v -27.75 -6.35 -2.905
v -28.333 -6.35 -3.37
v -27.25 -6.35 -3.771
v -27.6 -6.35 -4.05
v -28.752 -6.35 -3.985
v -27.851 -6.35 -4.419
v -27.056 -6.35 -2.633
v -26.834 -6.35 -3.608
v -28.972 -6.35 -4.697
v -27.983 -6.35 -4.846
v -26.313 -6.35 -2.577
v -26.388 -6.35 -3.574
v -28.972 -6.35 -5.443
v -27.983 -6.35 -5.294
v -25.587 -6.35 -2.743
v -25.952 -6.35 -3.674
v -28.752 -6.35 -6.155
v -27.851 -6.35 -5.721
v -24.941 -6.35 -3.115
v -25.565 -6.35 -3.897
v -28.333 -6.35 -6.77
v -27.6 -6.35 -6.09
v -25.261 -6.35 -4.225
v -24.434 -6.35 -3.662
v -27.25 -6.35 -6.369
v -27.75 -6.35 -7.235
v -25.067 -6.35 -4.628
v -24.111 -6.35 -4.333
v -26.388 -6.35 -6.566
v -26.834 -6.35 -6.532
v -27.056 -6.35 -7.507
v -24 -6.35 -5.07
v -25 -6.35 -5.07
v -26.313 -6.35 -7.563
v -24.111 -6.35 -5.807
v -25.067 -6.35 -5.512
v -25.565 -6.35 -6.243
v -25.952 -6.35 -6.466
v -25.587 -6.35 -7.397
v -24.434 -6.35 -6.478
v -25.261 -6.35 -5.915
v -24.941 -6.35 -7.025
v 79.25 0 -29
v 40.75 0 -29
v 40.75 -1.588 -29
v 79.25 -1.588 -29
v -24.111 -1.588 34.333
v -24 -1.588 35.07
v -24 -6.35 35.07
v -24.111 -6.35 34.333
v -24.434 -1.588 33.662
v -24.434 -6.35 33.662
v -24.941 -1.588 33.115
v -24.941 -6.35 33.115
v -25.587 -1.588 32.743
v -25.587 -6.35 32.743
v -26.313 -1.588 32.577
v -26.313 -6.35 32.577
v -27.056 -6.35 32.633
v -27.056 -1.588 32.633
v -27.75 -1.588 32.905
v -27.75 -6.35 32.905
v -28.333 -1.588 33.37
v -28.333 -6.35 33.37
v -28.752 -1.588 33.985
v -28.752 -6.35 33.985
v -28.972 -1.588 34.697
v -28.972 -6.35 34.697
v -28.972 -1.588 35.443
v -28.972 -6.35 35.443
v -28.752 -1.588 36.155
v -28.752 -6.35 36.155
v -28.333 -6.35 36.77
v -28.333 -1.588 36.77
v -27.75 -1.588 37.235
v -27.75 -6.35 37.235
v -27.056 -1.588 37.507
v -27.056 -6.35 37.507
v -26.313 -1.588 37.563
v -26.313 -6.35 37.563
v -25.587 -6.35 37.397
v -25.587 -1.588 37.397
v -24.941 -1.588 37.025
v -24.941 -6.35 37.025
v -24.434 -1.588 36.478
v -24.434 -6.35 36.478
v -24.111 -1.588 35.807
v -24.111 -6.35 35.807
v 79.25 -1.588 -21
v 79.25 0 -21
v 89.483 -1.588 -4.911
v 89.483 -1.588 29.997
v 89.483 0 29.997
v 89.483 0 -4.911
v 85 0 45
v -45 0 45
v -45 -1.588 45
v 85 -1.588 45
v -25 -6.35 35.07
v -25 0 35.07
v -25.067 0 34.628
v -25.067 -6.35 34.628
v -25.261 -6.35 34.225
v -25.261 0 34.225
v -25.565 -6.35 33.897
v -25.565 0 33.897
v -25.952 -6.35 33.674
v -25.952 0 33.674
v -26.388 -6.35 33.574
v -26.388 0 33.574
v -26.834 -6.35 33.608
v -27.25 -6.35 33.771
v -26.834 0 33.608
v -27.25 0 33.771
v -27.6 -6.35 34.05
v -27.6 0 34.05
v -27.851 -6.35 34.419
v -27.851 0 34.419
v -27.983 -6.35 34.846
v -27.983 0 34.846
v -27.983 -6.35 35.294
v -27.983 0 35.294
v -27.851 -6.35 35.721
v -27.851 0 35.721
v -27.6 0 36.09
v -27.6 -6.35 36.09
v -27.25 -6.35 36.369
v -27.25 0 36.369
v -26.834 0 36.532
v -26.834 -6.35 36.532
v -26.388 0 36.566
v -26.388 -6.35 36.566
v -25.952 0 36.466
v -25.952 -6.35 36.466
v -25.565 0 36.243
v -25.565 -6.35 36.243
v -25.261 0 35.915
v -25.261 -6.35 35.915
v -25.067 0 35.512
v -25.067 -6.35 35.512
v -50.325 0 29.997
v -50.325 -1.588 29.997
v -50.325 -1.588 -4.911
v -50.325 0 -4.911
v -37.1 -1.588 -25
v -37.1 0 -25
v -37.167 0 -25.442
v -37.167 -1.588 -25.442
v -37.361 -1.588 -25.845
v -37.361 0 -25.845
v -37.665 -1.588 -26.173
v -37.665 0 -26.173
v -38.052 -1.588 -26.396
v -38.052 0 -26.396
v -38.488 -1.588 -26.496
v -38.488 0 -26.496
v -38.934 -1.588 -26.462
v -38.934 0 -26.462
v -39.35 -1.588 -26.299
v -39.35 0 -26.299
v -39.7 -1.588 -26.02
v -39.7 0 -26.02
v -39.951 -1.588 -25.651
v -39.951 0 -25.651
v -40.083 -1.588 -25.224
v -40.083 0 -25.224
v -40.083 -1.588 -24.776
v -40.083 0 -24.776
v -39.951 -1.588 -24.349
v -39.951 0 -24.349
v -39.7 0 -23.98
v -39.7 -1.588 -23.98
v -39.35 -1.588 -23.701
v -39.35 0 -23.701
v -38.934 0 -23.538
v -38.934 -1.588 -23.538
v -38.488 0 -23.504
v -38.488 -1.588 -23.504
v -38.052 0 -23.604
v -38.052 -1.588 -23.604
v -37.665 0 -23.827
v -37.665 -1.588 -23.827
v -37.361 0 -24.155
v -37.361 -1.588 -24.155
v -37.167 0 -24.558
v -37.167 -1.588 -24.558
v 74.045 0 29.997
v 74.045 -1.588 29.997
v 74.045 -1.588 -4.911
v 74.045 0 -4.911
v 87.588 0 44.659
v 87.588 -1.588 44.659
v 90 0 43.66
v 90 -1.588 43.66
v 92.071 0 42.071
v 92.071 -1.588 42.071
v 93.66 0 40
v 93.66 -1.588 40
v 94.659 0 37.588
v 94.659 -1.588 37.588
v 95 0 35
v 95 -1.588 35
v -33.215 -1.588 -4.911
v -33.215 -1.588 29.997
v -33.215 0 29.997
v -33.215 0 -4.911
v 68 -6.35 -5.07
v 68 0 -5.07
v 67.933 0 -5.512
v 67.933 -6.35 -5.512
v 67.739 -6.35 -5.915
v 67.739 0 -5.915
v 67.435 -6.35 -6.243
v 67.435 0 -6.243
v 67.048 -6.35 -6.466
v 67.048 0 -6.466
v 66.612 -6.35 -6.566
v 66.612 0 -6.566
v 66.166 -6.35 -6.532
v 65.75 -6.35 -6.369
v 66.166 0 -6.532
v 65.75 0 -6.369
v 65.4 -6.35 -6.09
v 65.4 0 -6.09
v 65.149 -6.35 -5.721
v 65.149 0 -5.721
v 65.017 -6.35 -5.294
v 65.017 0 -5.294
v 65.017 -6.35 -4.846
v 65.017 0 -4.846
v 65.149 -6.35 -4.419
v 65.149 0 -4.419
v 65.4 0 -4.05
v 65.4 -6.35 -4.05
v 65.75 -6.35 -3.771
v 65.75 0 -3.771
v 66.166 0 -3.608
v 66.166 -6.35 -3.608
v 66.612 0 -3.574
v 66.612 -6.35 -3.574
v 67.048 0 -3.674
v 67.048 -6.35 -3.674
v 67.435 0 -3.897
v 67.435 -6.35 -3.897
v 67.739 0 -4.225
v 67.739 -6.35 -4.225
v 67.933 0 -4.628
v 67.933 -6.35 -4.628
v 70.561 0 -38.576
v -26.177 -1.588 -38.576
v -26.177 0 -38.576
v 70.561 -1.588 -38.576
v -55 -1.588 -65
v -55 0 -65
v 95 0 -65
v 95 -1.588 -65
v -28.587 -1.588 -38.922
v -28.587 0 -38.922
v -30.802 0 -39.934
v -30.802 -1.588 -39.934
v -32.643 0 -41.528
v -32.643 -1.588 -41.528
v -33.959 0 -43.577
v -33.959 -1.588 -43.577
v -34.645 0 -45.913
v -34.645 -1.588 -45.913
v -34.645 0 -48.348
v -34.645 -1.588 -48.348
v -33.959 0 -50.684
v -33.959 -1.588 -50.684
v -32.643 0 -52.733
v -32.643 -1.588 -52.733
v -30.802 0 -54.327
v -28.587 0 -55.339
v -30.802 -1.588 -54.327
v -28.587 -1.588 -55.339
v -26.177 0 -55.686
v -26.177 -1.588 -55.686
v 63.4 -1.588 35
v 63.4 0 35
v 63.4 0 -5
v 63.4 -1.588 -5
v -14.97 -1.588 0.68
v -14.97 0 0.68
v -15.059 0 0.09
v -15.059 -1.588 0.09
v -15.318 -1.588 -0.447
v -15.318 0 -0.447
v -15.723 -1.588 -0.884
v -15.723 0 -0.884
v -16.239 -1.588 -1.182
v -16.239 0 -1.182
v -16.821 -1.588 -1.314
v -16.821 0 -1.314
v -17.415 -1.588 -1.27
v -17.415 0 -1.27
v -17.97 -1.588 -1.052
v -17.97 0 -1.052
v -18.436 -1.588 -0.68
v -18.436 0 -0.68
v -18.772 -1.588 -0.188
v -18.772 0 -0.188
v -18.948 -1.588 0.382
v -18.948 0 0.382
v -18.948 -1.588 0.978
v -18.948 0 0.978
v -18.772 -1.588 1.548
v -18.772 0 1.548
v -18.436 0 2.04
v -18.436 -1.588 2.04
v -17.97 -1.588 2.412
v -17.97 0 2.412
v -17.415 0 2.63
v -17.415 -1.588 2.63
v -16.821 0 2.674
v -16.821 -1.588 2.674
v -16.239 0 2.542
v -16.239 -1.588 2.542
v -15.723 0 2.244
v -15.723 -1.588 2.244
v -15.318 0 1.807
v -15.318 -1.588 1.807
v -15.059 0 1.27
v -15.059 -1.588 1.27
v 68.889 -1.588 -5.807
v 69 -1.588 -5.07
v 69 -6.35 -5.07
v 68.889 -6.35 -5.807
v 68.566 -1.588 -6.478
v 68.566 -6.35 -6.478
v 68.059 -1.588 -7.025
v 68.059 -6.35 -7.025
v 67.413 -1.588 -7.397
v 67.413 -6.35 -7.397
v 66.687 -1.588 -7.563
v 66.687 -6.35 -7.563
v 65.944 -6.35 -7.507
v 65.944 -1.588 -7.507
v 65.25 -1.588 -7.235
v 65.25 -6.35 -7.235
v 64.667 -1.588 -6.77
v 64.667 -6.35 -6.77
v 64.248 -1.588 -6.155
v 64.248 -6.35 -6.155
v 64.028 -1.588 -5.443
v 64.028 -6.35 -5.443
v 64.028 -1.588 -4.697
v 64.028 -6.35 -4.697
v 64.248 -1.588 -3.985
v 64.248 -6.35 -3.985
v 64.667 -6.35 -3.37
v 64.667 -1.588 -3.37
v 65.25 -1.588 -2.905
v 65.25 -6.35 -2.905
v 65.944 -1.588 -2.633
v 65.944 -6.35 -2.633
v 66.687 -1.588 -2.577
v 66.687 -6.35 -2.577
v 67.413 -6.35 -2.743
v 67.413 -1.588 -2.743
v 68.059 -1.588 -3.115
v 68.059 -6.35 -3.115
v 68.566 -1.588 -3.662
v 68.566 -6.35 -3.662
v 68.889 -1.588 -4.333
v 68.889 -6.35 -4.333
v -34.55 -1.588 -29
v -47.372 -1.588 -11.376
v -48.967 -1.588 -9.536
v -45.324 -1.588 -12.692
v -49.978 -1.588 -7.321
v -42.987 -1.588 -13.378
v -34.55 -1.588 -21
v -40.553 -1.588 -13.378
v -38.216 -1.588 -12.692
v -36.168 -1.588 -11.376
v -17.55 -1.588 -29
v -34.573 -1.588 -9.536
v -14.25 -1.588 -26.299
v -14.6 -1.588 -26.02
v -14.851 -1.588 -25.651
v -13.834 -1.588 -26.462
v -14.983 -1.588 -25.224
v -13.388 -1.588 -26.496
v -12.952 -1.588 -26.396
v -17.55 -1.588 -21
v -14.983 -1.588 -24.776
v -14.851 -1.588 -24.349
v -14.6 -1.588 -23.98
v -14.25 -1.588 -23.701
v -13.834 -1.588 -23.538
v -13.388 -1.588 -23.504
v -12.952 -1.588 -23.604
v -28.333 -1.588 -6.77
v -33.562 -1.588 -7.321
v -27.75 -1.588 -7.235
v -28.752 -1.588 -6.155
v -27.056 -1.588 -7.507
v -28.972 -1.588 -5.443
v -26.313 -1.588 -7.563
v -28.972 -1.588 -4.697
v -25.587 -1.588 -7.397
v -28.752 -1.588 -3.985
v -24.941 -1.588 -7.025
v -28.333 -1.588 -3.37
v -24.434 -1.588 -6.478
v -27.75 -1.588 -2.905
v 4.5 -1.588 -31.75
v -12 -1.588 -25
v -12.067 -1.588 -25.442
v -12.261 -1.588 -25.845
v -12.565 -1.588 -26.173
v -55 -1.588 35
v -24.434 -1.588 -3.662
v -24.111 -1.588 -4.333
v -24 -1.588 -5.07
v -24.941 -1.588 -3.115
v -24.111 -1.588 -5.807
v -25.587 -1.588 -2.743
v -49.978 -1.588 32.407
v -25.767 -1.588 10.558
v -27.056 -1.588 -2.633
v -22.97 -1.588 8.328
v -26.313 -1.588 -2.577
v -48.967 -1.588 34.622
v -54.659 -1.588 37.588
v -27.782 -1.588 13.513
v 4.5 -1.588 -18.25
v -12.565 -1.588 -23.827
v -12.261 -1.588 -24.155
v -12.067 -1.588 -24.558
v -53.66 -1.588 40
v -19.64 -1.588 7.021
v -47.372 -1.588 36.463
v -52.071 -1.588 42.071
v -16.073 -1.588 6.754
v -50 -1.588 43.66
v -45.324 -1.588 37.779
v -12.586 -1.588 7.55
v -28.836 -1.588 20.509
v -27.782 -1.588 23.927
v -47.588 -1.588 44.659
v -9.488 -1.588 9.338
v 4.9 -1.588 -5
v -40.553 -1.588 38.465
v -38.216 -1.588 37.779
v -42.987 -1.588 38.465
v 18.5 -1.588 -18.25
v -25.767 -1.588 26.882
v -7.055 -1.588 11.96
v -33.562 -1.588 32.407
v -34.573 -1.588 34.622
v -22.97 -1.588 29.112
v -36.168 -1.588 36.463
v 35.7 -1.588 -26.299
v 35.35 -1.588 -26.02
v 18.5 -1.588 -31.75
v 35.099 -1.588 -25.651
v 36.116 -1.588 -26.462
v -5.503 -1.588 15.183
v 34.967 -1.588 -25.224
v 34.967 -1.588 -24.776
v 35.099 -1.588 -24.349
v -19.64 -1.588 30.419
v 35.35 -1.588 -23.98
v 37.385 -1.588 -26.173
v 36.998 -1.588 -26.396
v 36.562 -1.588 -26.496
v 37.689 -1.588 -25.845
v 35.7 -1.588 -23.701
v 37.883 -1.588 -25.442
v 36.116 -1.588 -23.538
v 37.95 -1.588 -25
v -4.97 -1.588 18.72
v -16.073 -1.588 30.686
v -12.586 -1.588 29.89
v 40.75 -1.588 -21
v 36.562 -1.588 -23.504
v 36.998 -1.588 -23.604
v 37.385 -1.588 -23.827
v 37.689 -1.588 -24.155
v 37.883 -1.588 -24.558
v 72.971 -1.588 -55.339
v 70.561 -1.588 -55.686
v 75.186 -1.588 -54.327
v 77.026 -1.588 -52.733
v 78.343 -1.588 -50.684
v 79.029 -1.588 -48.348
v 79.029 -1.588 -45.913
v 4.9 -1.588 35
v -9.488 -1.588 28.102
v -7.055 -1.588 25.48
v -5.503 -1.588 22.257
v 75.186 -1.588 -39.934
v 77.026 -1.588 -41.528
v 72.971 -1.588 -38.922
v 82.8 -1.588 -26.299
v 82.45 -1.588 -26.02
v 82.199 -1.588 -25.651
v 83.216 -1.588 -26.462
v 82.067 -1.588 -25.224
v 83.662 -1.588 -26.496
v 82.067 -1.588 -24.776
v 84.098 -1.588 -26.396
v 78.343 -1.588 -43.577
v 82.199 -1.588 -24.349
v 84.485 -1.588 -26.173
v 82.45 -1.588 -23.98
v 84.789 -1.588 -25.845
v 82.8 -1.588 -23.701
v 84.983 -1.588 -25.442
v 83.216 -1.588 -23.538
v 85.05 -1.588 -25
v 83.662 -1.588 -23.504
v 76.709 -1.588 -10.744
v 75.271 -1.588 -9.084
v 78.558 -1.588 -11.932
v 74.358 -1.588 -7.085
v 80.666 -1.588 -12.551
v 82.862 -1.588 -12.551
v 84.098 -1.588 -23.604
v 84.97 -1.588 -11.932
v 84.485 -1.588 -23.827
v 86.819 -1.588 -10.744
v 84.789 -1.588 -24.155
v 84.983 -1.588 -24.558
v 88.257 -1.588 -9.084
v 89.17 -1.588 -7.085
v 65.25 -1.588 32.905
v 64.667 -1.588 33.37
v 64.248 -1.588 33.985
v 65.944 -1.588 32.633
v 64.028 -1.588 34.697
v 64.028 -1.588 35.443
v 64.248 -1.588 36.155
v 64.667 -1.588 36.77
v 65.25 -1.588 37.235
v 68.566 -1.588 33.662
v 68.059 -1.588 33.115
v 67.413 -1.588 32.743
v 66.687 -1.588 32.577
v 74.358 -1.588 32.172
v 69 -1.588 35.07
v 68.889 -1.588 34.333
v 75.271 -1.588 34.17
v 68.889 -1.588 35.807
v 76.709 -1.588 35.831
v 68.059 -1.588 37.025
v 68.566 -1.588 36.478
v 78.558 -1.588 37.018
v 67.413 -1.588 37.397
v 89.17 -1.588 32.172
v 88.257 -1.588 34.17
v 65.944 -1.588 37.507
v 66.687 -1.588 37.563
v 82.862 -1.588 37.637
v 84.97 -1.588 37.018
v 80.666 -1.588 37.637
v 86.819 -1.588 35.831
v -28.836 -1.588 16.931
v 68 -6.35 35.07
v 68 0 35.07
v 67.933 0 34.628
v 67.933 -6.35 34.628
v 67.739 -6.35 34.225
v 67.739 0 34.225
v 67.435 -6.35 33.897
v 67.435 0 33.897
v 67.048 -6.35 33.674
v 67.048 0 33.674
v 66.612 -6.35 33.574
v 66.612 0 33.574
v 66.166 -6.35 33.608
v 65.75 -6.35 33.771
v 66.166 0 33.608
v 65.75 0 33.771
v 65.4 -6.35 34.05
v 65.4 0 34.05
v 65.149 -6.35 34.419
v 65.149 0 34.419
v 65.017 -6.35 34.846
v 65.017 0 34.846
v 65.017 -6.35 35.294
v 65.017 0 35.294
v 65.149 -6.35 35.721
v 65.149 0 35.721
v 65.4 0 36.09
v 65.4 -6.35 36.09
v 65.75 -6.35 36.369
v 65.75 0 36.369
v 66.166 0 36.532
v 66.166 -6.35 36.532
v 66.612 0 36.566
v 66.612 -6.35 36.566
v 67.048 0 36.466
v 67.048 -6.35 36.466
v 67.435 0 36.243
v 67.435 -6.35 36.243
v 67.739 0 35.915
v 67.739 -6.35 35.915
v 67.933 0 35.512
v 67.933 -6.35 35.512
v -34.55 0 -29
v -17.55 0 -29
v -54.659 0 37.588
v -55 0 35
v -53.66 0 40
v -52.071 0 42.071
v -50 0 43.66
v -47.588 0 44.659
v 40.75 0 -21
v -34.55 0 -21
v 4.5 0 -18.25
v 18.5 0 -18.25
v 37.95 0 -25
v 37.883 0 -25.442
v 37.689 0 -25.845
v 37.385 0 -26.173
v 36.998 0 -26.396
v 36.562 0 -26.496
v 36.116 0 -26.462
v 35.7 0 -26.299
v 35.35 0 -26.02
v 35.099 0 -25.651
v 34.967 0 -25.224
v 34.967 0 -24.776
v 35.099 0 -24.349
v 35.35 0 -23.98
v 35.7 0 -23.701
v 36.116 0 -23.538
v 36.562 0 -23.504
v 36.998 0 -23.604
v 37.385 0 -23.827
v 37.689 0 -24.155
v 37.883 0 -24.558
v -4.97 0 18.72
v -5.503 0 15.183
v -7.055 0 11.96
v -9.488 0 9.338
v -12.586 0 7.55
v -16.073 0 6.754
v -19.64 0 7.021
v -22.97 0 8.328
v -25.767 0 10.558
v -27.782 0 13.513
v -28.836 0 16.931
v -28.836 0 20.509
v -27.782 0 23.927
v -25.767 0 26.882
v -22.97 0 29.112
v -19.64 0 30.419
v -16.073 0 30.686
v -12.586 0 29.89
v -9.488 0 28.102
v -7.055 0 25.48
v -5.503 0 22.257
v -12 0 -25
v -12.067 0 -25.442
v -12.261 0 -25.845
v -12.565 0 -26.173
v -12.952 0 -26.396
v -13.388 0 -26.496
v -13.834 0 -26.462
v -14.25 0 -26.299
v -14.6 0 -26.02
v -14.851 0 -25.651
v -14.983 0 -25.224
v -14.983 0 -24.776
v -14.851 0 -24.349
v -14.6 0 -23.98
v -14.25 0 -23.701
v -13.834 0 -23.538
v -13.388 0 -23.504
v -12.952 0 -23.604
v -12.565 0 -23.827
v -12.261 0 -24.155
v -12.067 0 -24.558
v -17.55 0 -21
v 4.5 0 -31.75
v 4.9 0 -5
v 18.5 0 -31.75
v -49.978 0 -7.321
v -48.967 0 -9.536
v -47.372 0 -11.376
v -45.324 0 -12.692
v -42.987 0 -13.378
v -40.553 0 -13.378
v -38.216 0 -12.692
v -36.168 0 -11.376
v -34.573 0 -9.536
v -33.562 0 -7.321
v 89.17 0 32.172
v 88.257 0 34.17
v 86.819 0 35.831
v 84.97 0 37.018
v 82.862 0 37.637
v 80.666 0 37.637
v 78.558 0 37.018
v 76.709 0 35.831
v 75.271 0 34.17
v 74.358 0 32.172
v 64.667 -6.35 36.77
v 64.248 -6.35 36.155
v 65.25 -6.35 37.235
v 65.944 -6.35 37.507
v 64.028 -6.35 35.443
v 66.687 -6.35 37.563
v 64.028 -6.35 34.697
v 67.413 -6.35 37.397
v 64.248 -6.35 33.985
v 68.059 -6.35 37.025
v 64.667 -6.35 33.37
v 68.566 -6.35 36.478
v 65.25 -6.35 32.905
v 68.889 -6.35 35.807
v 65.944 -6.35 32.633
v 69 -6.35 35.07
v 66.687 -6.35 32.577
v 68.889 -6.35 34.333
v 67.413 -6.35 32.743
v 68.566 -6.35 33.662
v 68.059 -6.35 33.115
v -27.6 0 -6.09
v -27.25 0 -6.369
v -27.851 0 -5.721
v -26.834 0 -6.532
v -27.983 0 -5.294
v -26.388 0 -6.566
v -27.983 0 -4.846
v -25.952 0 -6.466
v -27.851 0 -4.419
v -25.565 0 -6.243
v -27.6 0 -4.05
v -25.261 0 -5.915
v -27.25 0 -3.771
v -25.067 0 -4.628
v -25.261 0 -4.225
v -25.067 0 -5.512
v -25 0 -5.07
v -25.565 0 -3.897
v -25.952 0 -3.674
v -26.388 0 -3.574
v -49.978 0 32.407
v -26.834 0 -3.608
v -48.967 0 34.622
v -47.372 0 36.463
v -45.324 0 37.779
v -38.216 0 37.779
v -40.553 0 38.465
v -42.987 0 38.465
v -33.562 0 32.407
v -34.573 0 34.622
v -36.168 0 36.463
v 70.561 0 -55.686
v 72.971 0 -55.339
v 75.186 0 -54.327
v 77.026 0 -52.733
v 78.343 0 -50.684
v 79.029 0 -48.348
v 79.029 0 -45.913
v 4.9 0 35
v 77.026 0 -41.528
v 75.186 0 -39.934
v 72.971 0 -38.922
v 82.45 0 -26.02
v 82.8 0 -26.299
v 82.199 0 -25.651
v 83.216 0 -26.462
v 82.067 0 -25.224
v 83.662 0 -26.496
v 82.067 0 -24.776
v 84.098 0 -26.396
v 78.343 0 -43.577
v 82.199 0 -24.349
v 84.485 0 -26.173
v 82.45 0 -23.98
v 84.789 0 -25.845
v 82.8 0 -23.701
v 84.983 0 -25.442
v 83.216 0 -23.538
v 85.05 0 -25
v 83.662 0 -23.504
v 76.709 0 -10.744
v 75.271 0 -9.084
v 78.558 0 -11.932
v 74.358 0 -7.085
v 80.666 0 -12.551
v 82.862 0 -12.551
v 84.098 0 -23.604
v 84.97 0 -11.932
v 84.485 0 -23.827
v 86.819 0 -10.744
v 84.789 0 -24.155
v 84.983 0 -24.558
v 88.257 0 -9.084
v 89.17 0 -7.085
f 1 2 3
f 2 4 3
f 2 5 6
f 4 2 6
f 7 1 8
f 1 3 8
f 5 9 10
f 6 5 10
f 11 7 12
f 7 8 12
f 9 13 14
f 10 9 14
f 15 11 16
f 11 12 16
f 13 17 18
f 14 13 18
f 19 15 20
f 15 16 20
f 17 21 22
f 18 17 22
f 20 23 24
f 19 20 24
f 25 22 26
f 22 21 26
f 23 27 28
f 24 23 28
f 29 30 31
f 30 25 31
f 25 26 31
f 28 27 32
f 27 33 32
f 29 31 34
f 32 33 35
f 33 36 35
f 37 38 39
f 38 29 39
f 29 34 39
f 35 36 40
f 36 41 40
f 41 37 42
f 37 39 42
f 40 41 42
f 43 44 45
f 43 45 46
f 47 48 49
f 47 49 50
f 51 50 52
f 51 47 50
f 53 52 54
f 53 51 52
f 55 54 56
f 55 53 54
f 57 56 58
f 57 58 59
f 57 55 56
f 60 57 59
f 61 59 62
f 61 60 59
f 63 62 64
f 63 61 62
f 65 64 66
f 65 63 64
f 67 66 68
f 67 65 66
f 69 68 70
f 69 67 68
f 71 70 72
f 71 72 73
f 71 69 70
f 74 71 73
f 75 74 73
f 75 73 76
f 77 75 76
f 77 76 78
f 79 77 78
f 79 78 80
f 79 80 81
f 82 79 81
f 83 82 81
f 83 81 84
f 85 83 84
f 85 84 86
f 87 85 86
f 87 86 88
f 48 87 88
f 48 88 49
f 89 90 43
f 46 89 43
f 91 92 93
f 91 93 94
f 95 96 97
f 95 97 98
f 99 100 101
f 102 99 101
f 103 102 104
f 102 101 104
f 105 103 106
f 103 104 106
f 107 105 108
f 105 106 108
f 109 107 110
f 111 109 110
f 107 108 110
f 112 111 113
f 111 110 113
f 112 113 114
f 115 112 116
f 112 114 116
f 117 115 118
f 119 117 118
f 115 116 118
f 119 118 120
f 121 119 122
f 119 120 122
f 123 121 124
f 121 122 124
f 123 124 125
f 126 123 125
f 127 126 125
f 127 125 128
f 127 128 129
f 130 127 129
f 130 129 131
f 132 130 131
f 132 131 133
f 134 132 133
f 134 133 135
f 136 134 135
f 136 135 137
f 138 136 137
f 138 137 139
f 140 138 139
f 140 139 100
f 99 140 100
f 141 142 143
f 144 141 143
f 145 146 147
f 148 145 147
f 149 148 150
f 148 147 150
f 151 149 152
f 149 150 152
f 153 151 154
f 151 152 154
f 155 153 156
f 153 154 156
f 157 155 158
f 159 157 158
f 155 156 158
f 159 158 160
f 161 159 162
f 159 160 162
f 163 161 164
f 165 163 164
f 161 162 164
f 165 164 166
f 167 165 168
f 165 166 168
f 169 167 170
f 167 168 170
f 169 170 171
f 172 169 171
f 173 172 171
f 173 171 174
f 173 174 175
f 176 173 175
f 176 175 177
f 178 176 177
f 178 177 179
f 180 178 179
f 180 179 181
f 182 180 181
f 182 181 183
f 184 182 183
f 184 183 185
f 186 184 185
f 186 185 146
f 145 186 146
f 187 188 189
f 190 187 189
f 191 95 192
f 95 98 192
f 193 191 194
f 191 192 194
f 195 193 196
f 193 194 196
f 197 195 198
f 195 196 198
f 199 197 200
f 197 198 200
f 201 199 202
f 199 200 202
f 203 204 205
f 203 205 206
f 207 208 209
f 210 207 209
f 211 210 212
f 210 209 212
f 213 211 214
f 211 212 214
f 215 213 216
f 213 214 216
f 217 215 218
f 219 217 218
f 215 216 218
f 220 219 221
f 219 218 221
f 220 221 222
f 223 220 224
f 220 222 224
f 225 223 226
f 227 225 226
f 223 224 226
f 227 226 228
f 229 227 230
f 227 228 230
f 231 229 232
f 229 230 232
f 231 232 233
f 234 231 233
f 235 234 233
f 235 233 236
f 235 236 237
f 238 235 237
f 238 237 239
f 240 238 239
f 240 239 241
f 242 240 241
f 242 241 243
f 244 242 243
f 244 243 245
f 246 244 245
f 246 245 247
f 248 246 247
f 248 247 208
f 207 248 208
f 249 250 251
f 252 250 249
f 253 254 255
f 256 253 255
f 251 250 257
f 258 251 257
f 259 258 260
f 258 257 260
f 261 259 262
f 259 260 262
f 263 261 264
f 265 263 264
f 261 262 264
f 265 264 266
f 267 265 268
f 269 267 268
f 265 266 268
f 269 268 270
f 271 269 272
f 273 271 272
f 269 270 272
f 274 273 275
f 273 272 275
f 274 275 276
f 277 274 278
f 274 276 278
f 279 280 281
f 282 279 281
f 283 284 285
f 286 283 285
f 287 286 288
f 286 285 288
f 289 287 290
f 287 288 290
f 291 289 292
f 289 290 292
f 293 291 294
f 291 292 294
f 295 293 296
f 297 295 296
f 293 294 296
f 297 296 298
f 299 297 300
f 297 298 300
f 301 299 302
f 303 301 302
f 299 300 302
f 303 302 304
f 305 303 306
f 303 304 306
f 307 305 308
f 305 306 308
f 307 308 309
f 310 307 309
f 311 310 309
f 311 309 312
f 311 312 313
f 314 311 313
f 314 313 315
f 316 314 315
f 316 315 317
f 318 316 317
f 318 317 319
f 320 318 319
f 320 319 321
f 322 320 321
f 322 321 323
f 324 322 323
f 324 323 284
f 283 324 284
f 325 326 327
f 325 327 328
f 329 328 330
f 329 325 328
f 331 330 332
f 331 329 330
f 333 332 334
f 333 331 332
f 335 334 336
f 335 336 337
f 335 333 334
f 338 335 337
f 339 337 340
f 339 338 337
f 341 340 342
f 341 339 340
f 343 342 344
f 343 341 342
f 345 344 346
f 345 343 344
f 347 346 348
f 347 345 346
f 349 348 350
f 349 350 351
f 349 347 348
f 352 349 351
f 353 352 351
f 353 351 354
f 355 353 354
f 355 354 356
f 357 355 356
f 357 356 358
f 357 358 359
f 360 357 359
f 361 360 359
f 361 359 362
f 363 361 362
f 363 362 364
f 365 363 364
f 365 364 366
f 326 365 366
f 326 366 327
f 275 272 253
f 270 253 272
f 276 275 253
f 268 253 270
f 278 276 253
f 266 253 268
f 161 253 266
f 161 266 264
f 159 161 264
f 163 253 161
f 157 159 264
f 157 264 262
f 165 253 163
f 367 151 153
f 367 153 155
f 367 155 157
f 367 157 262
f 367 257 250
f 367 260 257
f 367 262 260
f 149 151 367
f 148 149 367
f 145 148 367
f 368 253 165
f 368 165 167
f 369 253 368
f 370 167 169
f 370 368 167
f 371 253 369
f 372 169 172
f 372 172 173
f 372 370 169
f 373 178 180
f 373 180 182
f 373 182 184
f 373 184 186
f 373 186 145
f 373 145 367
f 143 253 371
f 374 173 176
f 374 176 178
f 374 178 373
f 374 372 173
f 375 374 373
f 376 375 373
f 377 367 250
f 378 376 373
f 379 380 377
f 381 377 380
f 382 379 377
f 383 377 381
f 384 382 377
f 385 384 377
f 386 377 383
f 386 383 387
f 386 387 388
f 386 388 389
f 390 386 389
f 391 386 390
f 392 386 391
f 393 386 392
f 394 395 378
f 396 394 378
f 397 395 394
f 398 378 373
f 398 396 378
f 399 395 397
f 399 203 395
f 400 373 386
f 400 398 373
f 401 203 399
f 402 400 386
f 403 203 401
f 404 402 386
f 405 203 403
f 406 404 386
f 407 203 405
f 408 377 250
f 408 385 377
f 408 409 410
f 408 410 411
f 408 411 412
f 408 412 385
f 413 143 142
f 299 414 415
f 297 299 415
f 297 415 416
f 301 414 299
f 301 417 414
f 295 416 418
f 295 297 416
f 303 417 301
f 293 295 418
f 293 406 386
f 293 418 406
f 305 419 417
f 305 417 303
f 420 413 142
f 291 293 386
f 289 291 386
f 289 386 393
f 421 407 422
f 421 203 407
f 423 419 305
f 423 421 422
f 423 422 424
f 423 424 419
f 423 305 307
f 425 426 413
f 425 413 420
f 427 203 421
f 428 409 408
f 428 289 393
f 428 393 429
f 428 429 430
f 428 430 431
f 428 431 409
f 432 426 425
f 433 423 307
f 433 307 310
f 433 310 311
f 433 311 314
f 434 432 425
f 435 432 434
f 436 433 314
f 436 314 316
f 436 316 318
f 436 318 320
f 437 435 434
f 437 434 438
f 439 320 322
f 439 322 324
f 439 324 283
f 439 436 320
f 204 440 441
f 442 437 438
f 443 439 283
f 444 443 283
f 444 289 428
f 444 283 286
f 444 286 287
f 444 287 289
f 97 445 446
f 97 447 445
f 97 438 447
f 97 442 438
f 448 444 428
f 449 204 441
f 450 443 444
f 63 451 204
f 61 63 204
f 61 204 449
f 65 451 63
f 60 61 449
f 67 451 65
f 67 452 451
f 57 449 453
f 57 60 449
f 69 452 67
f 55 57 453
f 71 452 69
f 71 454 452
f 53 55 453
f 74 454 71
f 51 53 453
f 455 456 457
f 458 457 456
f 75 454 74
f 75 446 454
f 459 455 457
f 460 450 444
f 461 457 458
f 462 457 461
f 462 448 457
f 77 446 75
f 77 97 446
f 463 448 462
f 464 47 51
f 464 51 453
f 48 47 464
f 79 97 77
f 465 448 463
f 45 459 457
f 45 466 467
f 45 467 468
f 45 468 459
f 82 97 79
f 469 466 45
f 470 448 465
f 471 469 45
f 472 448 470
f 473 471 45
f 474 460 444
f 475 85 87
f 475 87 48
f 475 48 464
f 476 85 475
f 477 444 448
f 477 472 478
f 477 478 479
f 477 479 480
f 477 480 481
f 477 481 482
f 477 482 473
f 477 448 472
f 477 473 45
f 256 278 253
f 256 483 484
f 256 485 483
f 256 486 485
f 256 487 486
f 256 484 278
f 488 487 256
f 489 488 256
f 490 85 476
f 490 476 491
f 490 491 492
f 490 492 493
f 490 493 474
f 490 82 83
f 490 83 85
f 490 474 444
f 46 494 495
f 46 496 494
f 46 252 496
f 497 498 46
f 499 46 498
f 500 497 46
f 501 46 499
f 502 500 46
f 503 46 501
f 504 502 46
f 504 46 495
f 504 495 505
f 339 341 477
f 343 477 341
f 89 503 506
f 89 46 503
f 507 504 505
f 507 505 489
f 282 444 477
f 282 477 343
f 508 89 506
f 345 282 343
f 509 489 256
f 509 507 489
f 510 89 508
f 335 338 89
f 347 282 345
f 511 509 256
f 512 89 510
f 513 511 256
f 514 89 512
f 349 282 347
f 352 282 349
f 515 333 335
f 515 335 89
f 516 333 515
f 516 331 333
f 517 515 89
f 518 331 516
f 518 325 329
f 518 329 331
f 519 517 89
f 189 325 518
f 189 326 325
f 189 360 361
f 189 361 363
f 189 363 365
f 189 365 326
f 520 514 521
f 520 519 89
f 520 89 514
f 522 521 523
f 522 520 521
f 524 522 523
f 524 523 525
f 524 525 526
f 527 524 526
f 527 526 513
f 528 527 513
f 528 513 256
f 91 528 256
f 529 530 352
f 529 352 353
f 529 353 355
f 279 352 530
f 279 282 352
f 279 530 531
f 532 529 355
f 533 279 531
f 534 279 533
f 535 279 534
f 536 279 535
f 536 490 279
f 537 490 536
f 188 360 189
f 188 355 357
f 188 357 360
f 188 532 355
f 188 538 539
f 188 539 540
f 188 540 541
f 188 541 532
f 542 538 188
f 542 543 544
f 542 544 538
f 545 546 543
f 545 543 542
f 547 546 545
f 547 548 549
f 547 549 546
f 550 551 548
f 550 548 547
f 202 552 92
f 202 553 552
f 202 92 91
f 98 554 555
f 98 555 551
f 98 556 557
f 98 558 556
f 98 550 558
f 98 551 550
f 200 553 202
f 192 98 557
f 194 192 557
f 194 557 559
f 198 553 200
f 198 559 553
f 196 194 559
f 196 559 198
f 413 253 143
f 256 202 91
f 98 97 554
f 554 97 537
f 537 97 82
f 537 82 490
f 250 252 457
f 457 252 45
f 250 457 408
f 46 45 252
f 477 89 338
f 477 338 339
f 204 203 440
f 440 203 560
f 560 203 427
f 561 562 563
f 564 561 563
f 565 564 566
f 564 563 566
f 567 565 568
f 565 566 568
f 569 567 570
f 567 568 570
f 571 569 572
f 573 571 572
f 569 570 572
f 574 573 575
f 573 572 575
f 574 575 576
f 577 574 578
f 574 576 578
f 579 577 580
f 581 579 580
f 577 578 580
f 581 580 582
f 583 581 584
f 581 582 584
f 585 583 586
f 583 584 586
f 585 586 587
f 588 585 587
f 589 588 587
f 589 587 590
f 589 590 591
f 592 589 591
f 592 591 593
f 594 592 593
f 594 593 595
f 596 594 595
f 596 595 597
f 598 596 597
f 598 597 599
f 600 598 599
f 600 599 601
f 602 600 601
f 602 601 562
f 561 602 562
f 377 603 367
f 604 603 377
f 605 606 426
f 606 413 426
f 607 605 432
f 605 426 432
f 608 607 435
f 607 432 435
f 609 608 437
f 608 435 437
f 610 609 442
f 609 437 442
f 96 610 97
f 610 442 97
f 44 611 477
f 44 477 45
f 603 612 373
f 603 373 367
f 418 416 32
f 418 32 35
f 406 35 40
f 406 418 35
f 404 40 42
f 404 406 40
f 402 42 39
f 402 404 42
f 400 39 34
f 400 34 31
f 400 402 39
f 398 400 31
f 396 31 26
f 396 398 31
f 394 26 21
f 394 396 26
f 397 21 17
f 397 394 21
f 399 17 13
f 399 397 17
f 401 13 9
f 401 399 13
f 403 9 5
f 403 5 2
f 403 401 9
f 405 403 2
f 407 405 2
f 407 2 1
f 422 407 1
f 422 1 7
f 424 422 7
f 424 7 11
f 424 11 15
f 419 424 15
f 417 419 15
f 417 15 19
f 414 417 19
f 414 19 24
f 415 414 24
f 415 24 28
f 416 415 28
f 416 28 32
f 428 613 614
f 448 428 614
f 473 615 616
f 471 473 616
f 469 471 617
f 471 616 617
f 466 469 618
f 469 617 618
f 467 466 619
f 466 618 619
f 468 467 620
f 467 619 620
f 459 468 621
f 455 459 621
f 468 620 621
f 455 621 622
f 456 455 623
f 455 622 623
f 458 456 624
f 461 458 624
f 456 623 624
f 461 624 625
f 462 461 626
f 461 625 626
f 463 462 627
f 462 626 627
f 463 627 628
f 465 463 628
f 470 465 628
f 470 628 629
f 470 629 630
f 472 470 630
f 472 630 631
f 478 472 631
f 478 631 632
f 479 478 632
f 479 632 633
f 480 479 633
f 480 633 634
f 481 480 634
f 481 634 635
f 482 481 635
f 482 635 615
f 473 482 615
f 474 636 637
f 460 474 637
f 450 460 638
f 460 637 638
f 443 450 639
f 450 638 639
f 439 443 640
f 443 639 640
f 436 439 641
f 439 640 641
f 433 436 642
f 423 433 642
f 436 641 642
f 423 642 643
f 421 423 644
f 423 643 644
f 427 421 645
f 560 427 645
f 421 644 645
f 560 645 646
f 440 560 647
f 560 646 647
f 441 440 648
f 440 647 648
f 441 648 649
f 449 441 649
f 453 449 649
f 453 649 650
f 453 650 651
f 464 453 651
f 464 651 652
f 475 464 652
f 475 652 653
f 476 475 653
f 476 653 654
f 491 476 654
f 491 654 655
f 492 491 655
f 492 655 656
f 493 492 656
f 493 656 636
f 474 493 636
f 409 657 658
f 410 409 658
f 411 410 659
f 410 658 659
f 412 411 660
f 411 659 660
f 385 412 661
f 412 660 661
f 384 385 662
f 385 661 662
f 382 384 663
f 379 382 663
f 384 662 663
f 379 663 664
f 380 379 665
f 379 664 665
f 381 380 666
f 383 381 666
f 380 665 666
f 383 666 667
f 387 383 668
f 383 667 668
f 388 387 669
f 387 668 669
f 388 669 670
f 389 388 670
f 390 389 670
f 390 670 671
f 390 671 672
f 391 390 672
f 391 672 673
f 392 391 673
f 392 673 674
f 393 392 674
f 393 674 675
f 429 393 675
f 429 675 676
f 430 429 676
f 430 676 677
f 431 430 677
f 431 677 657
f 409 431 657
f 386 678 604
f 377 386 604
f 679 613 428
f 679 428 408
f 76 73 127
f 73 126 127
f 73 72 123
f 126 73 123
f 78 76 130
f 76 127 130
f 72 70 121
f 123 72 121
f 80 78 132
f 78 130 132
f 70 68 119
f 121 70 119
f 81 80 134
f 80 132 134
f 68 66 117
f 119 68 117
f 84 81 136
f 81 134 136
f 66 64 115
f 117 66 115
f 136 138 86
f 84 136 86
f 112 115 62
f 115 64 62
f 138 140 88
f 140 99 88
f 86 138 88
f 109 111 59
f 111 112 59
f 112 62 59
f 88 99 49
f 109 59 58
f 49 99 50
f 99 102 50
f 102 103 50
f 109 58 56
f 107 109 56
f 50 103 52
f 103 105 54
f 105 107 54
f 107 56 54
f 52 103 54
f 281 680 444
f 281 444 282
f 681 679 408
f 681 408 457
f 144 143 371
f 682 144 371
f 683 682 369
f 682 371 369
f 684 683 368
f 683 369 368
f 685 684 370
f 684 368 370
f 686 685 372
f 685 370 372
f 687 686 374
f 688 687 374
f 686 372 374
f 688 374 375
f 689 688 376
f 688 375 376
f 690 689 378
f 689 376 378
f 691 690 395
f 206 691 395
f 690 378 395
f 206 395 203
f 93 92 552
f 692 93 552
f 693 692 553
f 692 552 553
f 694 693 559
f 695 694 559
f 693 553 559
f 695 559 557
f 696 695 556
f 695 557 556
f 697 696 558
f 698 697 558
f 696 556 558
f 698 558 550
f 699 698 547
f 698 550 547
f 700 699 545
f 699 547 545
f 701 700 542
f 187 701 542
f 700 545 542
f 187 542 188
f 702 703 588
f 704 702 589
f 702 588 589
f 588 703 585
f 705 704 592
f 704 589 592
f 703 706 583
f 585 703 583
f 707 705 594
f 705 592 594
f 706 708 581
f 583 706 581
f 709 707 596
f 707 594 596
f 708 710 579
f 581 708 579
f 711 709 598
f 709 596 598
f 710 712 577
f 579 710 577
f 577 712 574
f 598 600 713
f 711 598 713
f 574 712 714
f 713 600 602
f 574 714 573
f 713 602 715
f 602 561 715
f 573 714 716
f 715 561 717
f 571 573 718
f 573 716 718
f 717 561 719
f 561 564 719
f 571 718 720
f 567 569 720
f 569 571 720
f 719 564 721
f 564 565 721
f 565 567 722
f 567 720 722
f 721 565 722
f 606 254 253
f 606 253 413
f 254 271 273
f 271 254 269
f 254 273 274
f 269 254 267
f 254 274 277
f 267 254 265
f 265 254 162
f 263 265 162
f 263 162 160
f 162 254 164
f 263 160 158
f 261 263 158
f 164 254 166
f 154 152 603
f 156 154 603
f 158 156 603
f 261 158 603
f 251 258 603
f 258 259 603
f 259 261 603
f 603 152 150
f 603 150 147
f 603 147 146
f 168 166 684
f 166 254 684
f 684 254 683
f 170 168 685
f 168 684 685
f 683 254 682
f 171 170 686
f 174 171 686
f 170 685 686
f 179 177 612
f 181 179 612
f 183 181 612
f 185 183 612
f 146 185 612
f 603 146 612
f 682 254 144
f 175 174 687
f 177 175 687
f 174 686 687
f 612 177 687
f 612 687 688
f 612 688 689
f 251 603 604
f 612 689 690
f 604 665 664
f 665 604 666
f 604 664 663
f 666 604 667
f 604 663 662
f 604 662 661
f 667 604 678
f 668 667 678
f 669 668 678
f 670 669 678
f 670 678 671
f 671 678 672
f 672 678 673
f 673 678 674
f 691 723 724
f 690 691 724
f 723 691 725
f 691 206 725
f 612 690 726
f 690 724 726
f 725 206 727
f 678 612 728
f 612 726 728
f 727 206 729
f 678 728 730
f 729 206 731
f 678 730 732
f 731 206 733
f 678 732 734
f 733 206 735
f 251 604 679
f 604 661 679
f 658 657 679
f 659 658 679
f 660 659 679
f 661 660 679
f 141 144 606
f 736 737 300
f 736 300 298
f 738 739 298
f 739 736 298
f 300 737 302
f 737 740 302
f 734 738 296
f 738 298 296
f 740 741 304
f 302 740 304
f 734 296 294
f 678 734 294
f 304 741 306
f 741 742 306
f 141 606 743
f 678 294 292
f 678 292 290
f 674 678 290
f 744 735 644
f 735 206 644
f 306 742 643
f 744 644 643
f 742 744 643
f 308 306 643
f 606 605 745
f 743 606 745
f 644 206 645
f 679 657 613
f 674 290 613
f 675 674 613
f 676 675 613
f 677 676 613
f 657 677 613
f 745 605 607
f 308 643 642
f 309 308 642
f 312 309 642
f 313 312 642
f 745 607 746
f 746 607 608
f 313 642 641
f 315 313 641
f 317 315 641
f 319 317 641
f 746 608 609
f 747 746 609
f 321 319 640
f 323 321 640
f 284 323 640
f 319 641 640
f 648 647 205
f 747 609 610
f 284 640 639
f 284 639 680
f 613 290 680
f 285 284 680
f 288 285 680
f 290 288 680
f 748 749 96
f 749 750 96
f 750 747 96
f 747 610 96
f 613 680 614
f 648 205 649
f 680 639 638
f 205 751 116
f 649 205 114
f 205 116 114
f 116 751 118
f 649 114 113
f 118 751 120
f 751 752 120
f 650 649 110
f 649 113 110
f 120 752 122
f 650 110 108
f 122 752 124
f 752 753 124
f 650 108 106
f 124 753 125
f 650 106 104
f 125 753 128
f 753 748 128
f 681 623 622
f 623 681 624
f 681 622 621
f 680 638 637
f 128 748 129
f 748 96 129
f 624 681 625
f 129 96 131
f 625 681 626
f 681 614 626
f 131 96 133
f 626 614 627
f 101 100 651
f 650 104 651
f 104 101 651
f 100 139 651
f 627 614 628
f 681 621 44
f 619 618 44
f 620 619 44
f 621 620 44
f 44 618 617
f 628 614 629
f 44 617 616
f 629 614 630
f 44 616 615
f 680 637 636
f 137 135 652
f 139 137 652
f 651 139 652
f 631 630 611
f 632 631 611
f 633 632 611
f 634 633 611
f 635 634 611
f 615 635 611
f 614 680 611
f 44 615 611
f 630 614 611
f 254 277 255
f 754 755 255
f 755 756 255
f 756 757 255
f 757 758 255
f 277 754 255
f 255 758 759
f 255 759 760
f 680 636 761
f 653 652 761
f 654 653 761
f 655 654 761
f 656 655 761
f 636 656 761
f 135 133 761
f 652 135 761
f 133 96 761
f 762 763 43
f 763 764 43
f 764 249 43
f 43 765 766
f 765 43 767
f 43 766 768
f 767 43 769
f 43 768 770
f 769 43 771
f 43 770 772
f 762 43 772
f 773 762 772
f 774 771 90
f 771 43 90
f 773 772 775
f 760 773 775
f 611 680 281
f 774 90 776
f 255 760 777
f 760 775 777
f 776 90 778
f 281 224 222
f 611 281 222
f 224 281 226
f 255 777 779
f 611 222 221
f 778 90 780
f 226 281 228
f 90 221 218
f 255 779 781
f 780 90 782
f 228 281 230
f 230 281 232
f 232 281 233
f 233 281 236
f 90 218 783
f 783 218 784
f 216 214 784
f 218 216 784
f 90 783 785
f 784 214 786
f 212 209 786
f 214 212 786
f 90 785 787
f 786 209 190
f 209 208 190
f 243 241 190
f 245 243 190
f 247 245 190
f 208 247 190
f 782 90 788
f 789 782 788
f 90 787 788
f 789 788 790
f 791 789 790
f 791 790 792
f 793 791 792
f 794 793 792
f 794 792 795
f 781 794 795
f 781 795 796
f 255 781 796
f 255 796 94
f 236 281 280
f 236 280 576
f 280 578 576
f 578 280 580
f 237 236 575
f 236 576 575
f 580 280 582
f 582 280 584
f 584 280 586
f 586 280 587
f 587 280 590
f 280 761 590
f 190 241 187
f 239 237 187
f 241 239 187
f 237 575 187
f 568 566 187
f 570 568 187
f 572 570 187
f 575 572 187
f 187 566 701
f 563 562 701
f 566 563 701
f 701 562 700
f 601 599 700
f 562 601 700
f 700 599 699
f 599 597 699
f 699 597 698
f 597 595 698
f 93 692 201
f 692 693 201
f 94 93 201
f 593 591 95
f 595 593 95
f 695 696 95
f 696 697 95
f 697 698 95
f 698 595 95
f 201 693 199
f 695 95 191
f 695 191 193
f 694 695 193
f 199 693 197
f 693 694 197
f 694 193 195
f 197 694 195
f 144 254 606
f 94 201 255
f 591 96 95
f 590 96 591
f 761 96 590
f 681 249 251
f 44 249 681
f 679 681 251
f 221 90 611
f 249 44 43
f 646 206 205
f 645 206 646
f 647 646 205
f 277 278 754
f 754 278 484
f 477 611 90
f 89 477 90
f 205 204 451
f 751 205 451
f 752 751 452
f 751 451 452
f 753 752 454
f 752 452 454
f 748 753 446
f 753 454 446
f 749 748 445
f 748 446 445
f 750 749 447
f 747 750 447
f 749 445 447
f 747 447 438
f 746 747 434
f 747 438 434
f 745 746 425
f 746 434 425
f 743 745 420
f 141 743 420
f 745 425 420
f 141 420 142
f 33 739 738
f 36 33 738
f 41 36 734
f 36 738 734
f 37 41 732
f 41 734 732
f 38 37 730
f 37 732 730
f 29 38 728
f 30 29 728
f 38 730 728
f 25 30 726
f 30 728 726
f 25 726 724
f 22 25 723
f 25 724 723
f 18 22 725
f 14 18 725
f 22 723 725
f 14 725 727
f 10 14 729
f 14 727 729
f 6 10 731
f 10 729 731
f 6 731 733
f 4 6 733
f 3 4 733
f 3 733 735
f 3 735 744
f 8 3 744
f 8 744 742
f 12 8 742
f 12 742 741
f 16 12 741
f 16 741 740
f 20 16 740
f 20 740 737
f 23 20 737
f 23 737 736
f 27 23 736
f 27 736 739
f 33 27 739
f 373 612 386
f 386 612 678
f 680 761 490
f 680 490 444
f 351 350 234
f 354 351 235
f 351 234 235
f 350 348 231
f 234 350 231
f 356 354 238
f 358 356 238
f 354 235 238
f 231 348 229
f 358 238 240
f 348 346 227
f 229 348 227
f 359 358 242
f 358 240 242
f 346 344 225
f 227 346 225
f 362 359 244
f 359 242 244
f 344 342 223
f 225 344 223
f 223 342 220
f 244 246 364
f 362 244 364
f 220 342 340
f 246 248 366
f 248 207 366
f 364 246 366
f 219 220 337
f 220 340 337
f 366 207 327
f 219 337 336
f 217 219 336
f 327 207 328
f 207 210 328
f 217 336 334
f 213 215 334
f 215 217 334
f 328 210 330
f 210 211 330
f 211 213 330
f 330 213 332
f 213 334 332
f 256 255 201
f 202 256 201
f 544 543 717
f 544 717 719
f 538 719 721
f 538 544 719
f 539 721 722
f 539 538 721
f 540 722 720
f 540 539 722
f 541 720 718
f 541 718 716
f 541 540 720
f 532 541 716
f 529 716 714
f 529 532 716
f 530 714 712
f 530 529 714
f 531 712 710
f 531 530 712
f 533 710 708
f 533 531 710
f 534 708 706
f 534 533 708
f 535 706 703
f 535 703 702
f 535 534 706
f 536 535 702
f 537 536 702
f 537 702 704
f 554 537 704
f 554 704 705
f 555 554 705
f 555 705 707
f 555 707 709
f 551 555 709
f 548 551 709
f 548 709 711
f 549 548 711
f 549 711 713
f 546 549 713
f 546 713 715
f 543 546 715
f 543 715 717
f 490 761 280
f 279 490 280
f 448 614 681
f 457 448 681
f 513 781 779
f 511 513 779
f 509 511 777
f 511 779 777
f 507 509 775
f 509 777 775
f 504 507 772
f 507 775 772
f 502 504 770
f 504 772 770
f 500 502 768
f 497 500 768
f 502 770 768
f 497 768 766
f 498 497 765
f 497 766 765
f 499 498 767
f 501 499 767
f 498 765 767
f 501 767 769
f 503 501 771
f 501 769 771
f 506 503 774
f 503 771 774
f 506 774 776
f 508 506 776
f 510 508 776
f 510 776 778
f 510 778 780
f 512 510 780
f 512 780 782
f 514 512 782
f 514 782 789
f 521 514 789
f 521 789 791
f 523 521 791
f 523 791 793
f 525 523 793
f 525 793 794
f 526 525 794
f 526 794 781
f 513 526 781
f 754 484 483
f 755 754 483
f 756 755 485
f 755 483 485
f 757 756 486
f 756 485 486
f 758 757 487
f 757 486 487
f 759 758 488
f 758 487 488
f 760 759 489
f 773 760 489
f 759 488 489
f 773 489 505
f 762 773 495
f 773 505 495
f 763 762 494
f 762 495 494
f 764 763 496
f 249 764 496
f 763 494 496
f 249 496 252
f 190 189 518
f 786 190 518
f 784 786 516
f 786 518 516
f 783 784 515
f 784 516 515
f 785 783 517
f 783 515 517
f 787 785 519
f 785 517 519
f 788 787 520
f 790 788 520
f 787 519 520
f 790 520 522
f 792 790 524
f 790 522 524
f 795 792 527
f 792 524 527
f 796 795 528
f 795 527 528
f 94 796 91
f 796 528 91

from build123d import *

# Parameters (mm, degrees)
SKETCH_W        = 150
SKETCH_H        = 110
PAD_DEPTH       = 1.5875
SKETCH001_R     = 1.5
SKETCH001_R_2   = 12
SKETCH001_R_3   = 2
SKETCH001_W     = 58.5
SKETCH001_H     = 40
POCKET_DEPTH    = 1.5885
SKETCH002_R     = 1.5
SKETCH002_W     = 38.5
SKETCH002_H     = 8
SKETCH002_W_2   = 14
SKETCH002_H_2   = 13.5
SKETCH002_W_3   = 17
POCKET001_DEPTH = 1.5885
SKETCH003_R     = 2.5
SKETCH003_R_2   = 1.5
PAD001_DEPTH    = 6.35
POCKET002_DEPTH = 1.5885
FILLET_R        = 10


with BuildPart() as part:
    # Sketch → Pad (new body)
    with BuildSketch(Plane.XZ):
        with Locations((20, -10)):
            Rectangle(SKETCH_W, SKETCH_H)
    extrude(amount=PAD_DEPTH)

    # Sketch001 (on Face5 of Pad) → Pocket (cut, through all)
    with BuildSketch(Plane(origin=(0, 0, 0), x_dir=(1, 0, 0), z_dir=(0, 1, 0))):
        with Locations((-26.5, 5.07)):
            Circle(SKETCH001_R)
        with Locations((-26.5, -35.07)):
            Circle(SKETCH001_R)
        with Locations((66.5, -35.07)):
            Circle(SKETCH001_R)
        with Locations((66.5, 5.07)):
            Circle(SKETCH001_R)
        with Locations((-16.97, -18.72)):
            Circle(SKETCH001_R_2)
        with Locations((-16.97, -0.68)):
            Circle(SKETCH001_R_3)
        with Locations((34.15, -15)):
            Rectangle(SKETCH001_W, SKETCH001_H)
    extrude(amount=-POCKET_DEPTH, mode=Mode.SUBTRACT)

    # Sketch002 (on Face4 of Pocket) → Pocket001 (cut, through all)
    with BuildSketch(Plane(origin=(0, 0, 0), x_dir=(1, 0, 0), z_dir=(0, 1, 0))):
        with Locations((36.45, 25)):
            Circle(SKETCH002_R)
        with Locations((83.55, 25)):
            Circle(SKETCH002_R)
        with Locations((-38.6, 25)):
            Circle(SKETCH002_R)
        with Locations((-13.5, 25)):
            Circle(SKETCH002_R)
        with Locations((60, 25)):
            Rectangle(SKETCH002_W, SKETCH002_H)
        with Locations((11.5, 25)):
            Rectangle(SKETCH002_W_2, SKETCH002_H_2)
        with Locations((-26.05, 25)):
            Rectangle(SKETCH002_W_3, SKETCH002_H)
    extrude(amount=-POCKET001_DEPTH, mode=Mode.SUBTRACT)

    # Sketch003 (on Face4 of Pocket001) → Pad001 (join)
    with BuildSketch(Plane(origin=(0, 0, 0), x_dir=(1, 0, 0), z_dir=(0, 1, 0))):
        with Locations((-26.5, 5.07)):
            Circle(SKETCH003_R)
        with Locations((-26.5, 5.07)):
            Circle(SKETCH003_R_2, mode=Mode.SUBTRACT)
        with Locations((-26.5, -35.07)):
            Circle(SKETCH003_R)
        with Locations((-26.5, -35.07)):
            Circle(SKETCH003_R_2, mode=Mode.SUBTRACT)
        with Locations((66.5, 5.07)):
            Circle(SKETCH003_R)
        with Locations((66.5, 5.07)):
            Circle(SKETCH003_R_2, mode=Mode.SUBTRACT)
        with Locations((66.5, -35.07)):
            Circle(SKETCH003_R)
        with Locations((66.5, -35.07)):
            Circle(SKETCH003_R_2, mode=Mode.SUBTRACT)
    extrude(amount=-PAD001_DEPTH)

    # Sketch004 (on Face5 of Pad001) → Pocket002 (cut, through all)
    with BuildSketch(Plane.XZ.offset(1.5875)):
        with BuildLine():
            ThreePointArc((-26.17718, -38.575536), (-34.73218, -47.130536), (-26.17718, -55.685536))
            Line((-26.17718, -55.685536), (70.560877, -55.685536))
            ThreePointArc((70.560877, -55.685536), (79.115877, -47.130536), (70.560877, -38.575536))
            Line((-26.17718, -38.575536), (70.560877, -38.575536))
        make_face()
        with BuildLine():
            ThreePointArc((-33.215195, 29.997324), (-41.77, 38.552129), (-50.324805, 29.997324))
            Line((-50.324805, 29.997324), (-50.324805, -4.910724))
            ThreePointArc((-50.324805, -4.910724), (-41.77, -13.465529), (-33.215195, -4.910724))
            Line((-33.215195, 29.997324), (-33.215195, -4.910724))
        make_face()
        with BuildLine():
            ThreePointArc((89.482501, 29.997324), (81.764, 37.715825), (74.045499, 29.997324))
            Line((74.045499, 29.997324), (74.045499, -4.910724))
            ThreePointArc((74.045499, -4.910724), (81.764, -12.629225), (89.482501, -4.910724))
            Line((89.482501, 29.997324), (89.482501, -4.910724))
        make_face()
    extrude(amount=-POCKET002_DEPTH, mode=Mode.SUBTRACT)

    # Fillet
    fillet_edges = [part.edges().sort_by_distance(p)[0] for p in [
        (95, -0.79375, 45),
        (-55, -0.79375, 45),
    ]]
    fillet(fillet_edges, radius=FILLET_R)


solid = part.part
